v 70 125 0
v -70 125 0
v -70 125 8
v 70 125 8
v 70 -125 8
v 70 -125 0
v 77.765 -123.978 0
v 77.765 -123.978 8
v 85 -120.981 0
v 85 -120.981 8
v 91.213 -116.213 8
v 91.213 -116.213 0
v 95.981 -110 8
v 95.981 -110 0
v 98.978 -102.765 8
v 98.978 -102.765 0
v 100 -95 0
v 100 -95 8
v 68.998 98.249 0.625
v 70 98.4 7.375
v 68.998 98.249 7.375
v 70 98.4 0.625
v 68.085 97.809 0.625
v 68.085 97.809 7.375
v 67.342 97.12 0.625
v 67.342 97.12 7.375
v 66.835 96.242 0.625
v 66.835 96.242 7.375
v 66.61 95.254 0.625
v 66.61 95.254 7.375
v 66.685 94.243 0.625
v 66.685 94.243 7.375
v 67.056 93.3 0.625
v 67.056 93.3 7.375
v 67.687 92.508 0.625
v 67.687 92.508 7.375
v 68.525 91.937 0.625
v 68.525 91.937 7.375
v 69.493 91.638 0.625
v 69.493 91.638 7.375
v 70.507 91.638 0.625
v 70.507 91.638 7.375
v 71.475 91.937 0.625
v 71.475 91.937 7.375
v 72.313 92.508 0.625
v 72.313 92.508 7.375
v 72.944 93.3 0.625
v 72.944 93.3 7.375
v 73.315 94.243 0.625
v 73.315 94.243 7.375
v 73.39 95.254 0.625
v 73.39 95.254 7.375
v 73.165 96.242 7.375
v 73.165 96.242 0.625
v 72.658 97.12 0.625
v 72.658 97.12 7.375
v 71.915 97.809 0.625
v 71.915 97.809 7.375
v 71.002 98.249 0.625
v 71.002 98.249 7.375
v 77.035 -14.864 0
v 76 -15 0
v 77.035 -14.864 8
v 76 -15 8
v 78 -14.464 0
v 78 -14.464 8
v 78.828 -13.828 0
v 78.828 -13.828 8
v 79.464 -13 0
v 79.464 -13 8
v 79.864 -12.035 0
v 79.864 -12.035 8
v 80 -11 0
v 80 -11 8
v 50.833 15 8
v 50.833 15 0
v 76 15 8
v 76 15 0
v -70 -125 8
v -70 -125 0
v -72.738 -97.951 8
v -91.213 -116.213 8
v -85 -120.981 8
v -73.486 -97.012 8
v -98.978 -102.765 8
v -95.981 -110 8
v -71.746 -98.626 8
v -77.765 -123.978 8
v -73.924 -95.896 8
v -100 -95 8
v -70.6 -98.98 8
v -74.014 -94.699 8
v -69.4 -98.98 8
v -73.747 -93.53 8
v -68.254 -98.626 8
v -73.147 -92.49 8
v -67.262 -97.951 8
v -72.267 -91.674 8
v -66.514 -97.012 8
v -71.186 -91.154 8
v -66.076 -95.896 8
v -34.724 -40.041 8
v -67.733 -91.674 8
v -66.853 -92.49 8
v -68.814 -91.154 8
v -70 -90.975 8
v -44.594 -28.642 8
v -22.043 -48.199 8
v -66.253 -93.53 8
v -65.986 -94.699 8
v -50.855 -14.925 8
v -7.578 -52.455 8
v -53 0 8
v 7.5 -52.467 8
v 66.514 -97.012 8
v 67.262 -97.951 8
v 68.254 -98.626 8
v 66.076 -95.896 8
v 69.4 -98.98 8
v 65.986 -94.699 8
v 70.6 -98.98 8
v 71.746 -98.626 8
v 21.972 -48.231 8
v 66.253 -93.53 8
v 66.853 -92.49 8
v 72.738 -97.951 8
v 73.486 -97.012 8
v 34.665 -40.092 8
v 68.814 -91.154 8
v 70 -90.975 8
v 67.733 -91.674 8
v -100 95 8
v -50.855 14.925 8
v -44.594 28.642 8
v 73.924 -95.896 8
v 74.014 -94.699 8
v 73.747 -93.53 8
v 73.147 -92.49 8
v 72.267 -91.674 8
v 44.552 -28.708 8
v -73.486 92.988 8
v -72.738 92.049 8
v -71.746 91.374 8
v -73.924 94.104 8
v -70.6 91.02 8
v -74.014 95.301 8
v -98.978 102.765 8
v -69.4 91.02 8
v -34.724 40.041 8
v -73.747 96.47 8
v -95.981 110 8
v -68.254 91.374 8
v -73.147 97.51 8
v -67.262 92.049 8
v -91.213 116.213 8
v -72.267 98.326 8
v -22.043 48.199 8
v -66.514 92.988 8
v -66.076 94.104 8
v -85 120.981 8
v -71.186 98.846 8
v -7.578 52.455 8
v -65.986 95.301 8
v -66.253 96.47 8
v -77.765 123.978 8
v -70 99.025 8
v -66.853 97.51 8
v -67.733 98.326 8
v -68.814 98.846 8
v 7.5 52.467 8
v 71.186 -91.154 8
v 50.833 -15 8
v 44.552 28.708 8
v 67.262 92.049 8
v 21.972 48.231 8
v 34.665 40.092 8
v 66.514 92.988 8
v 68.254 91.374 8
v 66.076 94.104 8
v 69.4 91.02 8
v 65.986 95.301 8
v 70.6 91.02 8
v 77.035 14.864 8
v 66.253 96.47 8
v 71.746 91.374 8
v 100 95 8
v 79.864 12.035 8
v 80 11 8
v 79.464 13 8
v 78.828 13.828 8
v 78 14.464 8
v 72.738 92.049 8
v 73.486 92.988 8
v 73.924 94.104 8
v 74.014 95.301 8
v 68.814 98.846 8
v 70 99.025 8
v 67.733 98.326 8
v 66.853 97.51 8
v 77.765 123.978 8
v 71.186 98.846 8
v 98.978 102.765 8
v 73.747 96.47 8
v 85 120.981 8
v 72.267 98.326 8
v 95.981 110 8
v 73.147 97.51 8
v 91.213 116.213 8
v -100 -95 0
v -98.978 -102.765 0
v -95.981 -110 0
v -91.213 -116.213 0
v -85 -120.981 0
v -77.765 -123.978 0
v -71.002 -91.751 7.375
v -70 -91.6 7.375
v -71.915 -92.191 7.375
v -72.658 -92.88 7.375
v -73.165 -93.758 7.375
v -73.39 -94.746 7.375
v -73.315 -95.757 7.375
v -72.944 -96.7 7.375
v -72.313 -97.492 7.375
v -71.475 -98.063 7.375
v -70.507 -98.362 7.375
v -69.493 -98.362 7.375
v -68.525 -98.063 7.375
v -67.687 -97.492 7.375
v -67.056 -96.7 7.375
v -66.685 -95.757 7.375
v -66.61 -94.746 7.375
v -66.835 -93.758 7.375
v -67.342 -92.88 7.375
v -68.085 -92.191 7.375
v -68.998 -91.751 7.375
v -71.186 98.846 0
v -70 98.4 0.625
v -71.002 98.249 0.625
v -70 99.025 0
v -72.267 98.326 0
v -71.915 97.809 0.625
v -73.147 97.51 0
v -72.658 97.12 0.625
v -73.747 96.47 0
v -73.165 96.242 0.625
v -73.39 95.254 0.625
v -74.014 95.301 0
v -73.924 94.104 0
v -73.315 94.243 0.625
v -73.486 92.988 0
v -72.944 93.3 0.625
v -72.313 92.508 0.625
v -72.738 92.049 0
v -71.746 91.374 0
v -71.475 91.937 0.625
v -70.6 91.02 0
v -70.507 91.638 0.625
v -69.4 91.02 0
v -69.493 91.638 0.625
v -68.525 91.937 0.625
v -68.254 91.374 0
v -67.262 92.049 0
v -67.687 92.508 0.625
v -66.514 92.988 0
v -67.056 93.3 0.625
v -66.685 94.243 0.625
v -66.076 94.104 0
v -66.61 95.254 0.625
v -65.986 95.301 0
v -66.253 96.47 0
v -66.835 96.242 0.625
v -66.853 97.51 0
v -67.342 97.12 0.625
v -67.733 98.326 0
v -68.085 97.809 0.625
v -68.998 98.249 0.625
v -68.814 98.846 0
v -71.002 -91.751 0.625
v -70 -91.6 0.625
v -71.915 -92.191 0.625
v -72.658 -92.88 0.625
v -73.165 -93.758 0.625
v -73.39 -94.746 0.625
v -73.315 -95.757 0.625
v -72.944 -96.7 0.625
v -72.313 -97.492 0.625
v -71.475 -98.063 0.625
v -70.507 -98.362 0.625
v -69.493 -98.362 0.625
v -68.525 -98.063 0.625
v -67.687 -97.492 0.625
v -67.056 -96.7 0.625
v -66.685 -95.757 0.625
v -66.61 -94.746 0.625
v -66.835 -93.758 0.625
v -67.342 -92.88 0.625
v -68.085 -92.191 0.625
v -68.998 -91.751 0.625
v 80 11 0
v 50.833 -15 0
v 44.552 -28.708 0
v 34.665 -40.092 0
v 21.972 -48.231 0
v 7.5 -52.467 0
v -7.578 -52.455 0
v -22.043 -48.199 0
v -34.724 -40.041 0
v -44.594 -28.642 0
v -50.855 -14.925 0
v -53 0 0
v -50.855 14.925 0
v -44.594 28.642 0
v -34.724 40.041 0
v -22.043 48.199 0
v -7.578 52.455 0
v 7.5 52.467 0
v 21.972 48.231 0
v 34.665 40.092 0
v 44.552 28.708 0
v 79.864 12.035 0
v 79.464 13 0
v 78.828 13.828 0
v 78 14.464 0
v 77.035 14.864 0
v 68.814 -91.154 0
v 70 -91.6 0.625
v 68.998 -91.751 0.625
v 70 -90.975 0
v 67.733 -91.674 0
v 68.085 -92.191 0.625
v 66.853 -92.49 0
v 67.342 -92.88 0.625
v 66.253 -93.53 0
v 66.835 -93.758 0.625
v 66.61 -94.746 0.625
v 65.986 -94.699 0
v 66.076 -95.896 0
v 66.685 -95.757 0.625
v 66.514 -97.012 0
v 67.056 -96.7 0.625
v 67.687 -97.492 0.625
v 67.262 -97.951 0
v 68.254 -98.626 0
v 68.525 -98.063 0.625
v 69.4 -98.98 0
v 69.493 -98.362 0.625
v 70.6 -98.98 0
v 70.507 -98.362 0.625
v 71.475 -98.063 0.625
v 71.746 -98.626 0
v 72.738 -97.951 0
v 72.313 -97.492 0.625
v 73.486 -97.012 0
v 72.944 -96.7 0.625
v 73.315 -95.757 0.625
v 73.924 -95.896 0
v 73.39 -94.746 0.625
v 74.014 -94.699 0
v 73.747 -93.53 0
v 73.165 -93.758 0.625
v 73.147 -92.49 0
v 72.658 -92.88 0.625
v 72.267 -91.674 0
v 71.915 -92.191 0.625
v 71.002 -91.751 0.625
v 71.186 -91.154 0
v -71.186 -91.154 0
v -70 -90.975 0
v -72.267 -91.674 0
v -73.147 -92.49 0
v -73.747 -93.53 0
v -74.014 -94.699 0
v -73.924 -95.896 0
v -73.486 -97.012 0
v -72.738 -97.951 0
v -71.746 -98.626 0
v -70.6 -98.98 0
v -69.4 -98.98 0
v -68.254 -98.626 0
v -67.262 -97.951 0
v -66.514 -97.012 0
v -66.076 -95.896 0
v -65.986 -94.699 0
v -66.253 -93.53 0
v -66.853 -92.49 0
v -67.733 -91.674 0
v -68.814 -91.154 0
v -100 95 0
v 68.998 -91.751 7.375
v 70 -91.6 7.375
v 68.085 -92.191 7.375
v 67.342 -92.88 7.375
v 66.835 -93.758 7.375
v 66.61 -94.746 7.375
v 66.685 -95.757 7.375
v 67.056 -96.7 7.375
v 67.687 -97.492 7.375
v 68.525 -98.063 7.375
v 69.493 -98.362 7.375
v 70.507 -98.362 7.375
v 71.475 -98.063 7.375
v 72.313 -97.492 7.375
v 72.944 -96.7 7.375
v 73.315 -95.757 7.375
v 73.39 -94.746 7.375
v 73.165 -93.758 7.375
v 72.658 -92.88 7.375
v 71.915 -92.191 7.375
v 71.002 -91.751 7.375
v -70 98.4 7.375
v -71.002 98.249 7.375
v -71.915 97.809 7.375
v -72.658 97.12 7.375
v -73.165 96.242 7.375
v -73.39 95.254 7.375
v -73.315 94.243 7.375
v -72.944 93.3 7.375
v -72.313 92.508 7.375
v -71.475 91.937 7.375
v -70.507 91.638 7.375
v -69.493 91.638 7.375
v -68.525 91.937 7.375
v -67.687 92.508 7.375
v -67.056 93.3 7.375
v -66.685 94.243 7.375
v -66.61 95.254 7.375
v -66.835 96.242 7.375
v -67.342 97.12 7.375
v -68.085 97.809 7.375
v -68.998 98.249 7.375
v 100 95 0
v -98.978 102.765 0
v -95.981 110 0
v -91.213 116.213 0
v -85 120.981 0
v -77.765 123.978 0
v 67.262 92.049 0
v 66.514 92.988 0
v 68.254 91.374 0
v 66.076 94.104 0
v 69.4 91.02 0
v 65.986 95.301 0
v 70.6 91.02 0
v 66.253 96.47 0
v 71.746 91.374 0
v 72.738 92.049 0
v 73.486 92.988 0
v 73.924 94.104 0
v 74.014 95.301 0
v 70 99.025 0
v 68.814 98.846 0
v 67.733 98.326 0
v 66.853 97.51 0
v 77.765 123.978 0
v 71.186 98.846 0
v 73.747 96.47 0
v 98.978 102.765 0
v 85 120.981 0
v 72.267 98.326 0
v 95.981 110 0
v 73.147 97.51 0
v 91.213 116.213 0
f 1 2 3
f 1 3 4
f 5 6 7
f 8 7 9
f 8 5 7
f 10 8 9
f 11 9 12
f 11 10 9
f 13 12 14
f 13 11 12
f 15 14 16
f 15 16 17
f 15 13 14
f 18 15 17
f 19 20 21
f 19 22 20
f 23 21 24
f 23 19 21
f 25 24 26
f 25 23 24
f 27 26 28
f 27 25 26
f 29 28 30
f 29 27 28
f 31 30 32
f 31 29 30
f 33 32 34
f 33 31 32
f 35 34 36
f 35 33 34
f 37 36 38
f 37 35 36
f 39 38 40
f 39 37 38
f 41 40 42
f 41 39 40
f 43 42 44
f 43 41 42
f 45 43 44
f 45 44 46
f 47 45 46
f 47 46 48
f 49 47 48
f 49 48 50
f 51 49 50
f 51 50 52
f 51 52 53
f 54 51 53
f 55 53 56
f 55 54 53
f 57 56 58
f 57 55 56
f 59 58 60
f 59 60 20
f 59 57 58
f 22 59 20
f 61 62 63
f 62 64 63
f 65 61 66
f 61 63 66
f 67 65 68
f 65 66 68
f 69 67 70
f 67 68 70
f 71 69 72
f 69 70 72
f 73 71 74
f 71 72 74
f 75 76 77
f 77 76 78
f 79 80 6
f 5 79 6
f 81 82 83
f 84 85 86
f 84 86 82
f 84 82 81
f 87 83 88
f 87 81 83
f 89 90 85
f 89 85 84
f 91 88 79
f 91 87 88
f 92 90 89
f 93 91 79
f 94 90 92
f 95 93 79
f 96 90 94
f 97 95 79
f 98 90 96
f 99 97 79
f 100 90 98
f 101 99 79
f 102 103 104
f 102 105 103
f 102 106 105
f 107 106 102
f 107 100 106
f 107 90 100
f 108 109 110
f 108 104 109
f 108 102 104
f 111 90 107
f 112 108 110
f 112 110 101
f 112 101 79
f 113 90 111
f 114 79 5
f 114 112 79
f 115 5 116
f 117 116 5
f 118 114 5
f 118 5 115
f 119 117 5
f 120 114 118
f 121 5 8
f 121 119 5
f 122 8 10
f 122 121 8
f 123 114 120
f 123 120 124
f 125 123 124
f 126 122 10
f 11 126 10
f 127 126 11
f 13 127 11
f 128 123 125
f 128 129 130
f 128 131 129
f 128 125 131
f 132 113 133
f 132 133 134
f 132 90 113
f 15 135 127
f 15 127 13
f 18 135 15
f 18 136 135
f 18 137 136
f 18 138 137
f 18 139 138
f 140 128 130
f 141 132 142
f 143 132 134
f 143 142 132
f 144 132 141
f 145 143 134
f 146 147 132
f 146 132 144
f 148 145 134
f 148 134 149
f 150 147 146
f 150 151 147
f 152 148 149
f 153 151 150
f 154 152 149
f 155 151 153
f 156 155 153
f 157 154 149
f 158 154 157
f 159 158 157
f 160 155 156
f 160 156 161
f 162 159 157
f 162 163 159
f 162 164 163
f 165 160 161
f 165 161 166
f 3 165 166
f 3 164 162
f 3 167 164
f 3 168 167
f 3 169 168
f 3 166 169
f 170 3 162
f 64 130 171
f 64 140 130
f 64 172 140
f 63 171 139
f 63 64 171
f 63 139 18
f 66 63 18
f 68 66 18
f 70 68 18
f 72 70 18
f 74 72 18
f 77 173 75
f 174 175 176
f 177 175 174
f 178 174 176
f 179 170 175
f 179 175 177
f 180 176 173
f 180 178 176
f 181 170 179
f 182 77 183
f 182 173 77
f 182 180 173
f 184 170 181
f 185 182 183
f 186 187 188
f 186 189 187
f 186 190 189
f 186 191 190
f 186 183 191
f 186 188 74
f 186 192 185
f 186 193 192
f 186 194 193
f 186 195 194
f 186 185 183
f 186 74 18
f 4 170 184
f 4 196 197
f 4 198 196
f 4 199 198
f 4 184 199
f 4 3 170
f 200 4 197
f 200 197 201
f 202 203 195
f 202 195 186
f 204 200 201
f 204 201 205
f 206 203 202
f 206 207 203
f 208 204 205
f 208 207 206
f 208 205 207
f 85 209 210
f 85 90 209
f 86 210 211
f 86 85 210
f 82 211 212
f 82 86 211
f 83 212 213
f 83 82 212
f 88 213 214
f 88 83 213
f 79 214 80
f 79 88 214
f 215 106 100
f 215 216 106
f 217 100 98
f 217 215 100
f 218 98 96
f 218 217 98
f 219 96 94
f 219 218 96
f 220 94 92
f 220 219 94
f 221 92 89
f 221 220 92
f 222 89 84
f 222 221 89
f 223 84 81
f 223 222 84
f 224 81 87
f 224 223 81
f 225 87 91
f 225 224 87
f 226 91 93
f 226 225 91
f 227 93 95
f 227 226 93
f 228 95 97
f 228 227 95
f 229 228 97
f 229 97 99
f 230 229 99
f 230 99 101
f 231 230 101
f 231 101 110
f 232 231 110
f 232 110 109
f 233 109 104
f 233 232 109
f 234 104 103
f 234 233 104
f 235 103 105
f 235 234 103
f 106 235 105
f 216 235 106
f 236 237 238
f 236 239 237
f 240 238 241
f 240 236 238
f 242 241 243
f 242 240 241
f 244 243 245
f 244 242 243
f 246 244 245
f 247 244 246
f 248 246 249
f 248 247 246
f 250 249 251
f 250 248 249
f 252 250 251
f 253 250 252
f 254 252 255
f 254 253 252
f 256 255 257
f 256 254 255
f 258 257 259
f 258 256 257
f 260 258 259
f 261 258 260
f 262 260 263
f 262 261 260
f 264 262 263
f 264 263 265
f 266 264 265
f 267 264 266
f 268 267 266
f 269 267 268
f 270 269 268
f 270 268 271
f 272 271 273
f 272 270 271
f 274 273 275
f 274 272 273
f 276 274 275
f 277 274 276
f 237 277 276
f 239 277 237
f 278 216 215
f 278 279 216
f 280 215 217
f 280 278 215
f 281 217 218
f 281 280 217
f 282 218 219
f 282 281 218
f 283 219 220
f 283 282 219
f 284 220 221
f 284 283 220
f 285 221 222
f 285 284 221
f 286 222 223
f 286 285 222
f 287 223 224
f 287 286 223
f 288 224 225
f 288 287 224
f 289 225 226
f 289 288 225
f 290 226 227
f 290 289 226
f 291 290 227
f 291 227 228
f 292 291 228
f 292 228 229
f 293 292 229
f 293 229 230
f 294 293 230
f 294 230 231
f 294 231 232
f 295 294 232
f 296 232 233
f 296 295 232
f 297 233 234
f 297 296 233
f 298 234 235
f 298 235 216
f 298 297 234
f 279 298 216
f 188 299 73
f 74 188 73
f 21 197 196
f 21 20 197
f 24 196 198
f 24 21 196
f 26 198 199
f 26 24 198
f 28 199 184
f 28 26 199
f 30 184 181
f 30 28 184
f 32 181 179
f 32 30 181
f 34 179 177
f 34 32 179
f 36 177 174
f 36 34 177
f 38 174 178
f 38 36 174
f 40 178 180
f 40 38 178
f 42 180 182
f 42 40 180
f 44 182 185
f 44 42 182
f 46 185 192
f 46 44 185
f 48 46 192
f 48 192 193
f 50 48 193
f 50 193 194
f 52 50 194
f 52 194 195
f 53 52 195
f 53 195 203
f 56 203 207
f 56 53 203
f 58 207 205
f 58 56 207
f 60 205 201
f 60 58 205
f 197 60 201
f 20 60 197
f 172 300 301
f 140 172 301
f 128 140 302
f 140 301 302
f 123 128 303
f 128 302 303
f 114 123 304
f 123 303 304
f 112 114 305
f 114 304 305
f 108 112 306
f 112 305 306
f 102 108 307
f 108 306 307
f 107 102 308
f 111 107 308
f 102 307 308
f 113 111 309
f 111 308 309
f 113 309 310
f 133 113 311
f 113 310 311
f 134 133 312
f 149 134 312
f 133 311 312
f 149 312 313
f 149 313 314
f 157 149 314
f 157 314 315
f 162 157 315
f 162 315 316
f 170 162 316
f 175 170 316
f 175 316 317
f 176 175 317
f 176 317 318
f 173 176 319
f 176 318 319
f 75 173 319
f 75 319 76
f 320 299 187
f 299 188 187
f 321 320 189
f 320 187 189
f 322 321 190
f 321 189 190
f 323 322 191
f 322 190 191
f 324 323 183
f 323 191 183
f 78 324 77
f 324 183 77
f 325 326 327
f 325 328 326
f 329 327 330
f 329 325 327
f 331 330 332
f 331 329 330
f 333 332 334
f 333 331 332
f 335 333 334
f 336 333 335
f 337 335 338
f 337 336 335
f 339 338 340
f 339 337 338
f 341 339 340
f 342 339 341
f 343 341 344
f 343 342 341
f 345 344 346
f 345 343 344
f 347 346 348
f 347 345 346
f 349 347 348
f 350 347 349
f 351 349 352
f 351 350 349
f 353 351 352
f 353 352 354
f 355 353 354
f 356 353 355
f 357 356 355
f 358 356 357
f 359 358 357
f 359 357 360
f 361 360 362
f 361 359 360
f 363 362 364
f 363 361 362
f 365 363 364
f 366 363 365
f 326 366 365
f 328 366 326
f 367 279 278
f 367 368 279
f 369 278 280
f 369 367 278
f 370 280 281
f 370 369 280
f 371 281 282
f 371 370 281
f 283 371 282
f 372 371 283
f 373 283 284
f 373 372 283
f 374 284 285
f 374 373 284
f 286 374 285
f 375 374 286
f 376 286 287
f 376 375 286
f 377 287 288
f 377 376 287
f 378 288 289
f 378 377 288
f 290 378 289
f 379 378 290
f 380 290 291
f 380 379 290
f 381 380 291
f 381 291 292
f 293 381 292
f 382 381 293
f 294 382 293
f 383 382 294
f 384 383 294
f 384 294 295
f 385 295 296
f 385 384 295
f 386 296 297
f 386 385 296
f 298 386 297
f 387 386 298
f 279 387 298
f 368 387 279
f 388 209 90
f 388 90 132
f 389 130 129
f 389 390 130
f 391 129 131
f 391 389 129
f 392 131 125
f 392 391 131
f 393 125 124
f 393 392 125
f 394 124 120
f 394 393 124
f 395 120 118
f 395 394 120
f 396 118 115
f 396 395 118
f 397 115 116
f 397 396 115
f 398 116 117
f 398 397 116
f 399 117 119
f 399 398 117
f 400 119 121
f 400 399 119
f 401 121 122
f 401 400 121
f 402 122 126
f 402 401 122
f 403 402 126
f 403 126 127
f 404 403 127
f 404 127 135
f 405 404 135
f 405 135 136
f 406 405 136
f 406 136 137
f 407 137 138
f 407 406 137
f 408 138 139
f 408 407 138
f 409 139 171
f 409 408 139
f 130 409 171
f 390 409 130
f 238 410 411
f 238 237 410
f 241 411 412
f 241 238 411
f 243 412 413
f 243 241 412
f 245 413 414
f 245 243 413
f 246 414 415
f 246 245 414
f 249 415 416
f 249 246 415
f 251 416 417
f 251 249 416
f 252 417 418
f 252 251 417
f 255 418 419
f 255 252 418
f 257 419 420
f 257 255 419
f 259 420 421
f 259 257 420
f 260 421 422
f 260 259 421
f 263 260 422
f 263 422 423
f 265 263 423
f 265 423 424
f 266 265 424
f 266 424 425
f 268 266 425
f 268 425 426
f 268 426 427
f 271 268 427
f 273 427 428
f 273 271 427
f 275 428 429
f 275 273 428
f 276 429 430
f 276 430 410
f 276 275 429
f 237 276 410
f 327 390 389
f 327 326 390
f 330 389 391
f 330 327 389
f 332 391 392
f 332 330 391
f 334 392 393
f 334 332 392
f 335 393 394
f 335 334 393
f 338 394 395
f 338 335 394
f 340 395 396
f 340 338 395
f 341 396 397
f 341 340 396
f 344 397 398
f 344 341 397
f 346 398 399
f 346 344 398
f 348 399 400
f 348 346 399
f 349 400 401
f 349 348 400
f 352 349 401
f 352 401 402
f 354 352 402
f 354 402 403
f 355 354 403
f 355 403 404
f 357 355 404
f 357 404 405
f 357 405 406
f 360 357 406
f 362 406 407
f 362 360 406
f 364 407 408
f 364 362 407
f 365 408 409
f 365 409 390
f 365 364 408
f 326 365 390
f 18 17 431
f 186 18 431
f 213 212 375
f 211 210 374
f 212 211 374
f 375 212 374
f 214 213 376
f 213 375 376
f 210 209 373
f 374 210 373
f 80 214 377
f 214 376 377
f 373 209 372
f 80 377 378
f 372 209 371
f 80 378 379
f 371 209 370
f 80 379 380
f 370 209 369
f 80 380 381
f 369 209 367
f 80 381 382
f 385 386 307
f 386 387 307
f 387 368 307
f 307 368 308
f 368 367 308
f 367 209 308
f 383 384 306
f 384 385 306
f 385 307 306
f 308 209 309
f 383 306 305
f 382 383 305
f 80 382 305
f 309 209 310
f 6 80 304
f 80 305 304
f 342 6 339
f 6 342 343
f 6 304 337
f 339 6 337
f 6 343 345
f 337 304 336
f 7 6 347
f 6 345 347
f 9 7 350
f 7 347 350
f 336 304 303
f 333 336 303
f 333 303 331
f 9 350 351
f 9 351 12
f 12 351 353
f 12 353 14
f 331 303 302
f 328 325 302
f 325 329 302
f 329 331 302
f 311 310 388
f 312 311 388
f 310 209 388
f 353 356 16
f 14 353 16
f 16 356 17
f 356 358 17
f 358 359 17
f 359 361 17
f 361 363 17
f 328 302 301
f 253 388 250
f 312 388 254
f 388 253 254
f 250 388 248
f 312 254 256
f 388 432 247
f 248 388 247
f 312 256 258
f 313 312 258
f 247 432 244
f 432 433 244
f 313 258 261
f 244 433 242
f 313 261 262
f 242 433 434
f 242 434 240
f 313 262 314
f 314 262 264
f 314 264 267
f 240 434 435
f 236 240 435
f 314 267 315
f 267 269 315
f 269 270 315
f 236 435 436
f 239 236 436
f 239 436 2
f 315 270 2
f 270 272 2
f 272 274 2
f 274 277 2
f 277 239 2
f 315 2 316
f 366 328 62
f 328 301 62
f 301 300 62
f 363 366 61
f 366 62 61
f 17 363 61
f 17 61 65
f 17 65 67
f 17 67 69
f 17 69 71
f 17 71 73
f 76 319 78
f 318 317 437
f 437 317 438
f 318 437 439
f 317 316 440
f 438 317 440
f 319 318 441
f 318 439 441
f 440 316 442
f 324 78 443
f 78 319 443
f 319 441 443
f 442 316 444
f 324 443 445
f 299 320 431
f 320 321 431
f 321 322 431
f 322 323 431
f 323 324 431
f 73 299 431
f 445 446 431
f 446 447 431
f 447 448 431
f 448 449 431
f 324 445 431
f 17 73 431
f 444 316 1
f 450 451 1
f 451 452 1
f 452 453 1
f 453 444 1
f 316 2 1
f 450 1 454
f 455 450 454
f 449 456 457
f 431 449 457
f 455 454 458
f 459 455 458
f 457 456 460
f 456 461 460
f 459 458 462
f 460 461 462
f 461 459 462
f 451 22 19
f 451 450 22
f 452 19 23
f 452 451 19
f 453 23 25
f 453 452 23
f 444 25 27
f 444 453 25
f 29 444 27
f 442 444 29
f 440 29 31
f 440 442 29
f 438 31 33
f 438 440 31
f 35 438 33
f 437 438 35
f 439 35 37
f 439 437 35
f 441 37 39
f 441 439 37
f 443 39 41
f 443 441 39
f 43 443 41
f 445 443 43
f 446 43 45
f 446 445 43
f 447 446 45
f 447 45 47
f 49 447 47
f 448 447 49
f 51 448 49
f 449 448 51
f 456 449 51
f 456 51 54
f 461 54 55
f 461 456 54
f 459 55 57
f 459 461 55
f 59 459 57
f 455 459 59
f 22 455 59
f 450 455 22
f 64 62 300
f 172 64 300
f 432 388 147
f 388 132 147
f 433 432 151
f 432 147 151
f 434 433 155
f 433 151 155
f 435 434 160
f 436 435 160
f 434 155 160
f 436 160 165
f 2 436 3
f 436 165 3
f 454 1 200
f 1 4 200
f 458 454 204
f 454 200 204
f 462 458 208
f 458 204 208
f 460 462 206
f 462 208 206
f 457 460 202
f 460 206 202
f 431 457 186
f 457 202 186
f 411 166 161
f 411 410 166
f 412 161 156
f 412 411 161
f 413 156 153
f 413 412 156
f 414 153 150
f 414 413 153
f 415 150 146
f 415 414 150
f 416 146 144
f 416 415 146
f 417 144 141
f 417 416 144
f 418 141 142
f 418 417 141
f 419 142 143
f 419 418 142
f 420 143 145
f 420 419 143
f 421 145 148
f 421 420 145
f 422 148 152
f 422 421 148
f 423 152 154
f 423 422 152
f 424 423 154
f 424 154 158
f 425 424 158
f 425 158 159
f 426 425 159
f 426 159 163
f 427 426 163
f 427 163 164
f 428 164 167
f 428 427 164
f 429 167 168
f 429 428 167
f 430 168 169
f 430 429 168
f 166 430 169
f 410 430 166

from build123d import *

# Parameters (mm, degrees)
SKIZZE1_W                       = 200
SKIZZE1_H                       = 250
AUFSATZ_LINEAR_AUSTRAGEN1_DEPTH = 8
VERRUNDUNG1_R                   = 30
VERRUNDUNG2_R                   = 4
M8_GEWINDEBOHRUNG1_AT_2_COUNT   = 2
M8_GEWINDEBOHRUNG1_AT_2_PITCH   = 140
M8_GEWINDEBOHRUNG1_AT_3_COUNT   = 2
M8_GEWINDEBOHRUNG1_AT_3_PITCH   = 236.008474424
M8_GEWINDEBOHRUNG1_AT_4_COUNT   = 2
M8_GEWINDEBOHRUNG1_AT_4_PITCH   = 190


with BuildPart() as part:
    # Skizze1 → Aufsatz-Linear austragen1 (new body)
    with BuildSketch(Plane.XY):
        Rectangle(SKIZZE1_W, SKIZZE1_H)
        with BuildLine():
            Line((50.833060109, 15), (80, 15))
            Line((80, 15), (80, -15))
            Line((80, -15), (50.833060109, -15))
            ThreePointArc((50.833060109, -15), (-53, 0), (50.833060109, 15))
        make_face(mode=Mode.SUBTRACT)
    extrude(amount=AUFSATZ_LINEAR_AUSTRAGEN1_DEPTH)

    # Verrundung1
    verrundung1_edges = [part.edges().sort_by_distance(p)[0] for p in [
        (100, -125, 4),
        (-100, -125, 4),
        (-100, 125, 4),
        (100, 125, 4),
    ]]
    fillet(verrundung1_edges, radius=VERRUNDUNG1_R)

    # Verrundung2
    verrundung2_edges = [part.edges().sort_by_distance(p)[0] for p in [
        (80, -15, 4),
        (80, 15, 4),
    ]]
    fillet(verrundung2_edges, radius=VERRUNDUNG2_R)

    # Skizze3 → M8 Gewindebohrung1 (revolve, cut)
    with BuildSketch(Plane(origin=(70, 95, 0), x_dir=(0, 1, 0), z_dir=(1, 0, 0))):
        Polygon((0, 0), (0, 8), (4.025, 8), (3.4, 7.375), (3.4, 0.625), (4.025, 0), align=None)
    m8_gewindebohrung1 = revolve(axis=Axis((70, 95, -6.35), (0, 0, 1)), mode=Mode.SUBTRACT)

    # M8 Gewindebohrung1 at 2: M8 Gewindebohrung1 ×2
    with Locations(*[(-i * M8_GEWINDEBOHRUNG1_AT_2_PITCH, 0, 0) for i in range(1, M8_GEWINDEBOHRUNG1_AT_2_COUNT)]):
        add(m8_gewindebohrung1, mode=Mode.SUBTRACT)

    # M8 Gewindebohrung1 at 3: M8 Gewindebohrung1 ×2
    with Locations(*[Vector(-0.593199038, -0.805055837, 0) * (i * M8_GEWINDEBOHRUNG1_AT_3_PITCH) for i in range(1, M8_GEWINDEBOHRUNG1_AT_3_COUNT)]):
        add(m8_gewindebohrung1, mode=Mode.SUBTRACT)

    # M8 Gewindebohrung1 at 4: M8 Gewindebohrung1 ×2
    with Locations(*[(0, -i * M8_GEWINDEBOHRUNG1_AT_4_PITCH, 0) for i in range(1, M8_GEWINDEBOHRUNG1_AT_4_COUNT)]):
        add(m8_gewindebohrung1, mode=Mode.SUBTRACT)


solid = part.part
